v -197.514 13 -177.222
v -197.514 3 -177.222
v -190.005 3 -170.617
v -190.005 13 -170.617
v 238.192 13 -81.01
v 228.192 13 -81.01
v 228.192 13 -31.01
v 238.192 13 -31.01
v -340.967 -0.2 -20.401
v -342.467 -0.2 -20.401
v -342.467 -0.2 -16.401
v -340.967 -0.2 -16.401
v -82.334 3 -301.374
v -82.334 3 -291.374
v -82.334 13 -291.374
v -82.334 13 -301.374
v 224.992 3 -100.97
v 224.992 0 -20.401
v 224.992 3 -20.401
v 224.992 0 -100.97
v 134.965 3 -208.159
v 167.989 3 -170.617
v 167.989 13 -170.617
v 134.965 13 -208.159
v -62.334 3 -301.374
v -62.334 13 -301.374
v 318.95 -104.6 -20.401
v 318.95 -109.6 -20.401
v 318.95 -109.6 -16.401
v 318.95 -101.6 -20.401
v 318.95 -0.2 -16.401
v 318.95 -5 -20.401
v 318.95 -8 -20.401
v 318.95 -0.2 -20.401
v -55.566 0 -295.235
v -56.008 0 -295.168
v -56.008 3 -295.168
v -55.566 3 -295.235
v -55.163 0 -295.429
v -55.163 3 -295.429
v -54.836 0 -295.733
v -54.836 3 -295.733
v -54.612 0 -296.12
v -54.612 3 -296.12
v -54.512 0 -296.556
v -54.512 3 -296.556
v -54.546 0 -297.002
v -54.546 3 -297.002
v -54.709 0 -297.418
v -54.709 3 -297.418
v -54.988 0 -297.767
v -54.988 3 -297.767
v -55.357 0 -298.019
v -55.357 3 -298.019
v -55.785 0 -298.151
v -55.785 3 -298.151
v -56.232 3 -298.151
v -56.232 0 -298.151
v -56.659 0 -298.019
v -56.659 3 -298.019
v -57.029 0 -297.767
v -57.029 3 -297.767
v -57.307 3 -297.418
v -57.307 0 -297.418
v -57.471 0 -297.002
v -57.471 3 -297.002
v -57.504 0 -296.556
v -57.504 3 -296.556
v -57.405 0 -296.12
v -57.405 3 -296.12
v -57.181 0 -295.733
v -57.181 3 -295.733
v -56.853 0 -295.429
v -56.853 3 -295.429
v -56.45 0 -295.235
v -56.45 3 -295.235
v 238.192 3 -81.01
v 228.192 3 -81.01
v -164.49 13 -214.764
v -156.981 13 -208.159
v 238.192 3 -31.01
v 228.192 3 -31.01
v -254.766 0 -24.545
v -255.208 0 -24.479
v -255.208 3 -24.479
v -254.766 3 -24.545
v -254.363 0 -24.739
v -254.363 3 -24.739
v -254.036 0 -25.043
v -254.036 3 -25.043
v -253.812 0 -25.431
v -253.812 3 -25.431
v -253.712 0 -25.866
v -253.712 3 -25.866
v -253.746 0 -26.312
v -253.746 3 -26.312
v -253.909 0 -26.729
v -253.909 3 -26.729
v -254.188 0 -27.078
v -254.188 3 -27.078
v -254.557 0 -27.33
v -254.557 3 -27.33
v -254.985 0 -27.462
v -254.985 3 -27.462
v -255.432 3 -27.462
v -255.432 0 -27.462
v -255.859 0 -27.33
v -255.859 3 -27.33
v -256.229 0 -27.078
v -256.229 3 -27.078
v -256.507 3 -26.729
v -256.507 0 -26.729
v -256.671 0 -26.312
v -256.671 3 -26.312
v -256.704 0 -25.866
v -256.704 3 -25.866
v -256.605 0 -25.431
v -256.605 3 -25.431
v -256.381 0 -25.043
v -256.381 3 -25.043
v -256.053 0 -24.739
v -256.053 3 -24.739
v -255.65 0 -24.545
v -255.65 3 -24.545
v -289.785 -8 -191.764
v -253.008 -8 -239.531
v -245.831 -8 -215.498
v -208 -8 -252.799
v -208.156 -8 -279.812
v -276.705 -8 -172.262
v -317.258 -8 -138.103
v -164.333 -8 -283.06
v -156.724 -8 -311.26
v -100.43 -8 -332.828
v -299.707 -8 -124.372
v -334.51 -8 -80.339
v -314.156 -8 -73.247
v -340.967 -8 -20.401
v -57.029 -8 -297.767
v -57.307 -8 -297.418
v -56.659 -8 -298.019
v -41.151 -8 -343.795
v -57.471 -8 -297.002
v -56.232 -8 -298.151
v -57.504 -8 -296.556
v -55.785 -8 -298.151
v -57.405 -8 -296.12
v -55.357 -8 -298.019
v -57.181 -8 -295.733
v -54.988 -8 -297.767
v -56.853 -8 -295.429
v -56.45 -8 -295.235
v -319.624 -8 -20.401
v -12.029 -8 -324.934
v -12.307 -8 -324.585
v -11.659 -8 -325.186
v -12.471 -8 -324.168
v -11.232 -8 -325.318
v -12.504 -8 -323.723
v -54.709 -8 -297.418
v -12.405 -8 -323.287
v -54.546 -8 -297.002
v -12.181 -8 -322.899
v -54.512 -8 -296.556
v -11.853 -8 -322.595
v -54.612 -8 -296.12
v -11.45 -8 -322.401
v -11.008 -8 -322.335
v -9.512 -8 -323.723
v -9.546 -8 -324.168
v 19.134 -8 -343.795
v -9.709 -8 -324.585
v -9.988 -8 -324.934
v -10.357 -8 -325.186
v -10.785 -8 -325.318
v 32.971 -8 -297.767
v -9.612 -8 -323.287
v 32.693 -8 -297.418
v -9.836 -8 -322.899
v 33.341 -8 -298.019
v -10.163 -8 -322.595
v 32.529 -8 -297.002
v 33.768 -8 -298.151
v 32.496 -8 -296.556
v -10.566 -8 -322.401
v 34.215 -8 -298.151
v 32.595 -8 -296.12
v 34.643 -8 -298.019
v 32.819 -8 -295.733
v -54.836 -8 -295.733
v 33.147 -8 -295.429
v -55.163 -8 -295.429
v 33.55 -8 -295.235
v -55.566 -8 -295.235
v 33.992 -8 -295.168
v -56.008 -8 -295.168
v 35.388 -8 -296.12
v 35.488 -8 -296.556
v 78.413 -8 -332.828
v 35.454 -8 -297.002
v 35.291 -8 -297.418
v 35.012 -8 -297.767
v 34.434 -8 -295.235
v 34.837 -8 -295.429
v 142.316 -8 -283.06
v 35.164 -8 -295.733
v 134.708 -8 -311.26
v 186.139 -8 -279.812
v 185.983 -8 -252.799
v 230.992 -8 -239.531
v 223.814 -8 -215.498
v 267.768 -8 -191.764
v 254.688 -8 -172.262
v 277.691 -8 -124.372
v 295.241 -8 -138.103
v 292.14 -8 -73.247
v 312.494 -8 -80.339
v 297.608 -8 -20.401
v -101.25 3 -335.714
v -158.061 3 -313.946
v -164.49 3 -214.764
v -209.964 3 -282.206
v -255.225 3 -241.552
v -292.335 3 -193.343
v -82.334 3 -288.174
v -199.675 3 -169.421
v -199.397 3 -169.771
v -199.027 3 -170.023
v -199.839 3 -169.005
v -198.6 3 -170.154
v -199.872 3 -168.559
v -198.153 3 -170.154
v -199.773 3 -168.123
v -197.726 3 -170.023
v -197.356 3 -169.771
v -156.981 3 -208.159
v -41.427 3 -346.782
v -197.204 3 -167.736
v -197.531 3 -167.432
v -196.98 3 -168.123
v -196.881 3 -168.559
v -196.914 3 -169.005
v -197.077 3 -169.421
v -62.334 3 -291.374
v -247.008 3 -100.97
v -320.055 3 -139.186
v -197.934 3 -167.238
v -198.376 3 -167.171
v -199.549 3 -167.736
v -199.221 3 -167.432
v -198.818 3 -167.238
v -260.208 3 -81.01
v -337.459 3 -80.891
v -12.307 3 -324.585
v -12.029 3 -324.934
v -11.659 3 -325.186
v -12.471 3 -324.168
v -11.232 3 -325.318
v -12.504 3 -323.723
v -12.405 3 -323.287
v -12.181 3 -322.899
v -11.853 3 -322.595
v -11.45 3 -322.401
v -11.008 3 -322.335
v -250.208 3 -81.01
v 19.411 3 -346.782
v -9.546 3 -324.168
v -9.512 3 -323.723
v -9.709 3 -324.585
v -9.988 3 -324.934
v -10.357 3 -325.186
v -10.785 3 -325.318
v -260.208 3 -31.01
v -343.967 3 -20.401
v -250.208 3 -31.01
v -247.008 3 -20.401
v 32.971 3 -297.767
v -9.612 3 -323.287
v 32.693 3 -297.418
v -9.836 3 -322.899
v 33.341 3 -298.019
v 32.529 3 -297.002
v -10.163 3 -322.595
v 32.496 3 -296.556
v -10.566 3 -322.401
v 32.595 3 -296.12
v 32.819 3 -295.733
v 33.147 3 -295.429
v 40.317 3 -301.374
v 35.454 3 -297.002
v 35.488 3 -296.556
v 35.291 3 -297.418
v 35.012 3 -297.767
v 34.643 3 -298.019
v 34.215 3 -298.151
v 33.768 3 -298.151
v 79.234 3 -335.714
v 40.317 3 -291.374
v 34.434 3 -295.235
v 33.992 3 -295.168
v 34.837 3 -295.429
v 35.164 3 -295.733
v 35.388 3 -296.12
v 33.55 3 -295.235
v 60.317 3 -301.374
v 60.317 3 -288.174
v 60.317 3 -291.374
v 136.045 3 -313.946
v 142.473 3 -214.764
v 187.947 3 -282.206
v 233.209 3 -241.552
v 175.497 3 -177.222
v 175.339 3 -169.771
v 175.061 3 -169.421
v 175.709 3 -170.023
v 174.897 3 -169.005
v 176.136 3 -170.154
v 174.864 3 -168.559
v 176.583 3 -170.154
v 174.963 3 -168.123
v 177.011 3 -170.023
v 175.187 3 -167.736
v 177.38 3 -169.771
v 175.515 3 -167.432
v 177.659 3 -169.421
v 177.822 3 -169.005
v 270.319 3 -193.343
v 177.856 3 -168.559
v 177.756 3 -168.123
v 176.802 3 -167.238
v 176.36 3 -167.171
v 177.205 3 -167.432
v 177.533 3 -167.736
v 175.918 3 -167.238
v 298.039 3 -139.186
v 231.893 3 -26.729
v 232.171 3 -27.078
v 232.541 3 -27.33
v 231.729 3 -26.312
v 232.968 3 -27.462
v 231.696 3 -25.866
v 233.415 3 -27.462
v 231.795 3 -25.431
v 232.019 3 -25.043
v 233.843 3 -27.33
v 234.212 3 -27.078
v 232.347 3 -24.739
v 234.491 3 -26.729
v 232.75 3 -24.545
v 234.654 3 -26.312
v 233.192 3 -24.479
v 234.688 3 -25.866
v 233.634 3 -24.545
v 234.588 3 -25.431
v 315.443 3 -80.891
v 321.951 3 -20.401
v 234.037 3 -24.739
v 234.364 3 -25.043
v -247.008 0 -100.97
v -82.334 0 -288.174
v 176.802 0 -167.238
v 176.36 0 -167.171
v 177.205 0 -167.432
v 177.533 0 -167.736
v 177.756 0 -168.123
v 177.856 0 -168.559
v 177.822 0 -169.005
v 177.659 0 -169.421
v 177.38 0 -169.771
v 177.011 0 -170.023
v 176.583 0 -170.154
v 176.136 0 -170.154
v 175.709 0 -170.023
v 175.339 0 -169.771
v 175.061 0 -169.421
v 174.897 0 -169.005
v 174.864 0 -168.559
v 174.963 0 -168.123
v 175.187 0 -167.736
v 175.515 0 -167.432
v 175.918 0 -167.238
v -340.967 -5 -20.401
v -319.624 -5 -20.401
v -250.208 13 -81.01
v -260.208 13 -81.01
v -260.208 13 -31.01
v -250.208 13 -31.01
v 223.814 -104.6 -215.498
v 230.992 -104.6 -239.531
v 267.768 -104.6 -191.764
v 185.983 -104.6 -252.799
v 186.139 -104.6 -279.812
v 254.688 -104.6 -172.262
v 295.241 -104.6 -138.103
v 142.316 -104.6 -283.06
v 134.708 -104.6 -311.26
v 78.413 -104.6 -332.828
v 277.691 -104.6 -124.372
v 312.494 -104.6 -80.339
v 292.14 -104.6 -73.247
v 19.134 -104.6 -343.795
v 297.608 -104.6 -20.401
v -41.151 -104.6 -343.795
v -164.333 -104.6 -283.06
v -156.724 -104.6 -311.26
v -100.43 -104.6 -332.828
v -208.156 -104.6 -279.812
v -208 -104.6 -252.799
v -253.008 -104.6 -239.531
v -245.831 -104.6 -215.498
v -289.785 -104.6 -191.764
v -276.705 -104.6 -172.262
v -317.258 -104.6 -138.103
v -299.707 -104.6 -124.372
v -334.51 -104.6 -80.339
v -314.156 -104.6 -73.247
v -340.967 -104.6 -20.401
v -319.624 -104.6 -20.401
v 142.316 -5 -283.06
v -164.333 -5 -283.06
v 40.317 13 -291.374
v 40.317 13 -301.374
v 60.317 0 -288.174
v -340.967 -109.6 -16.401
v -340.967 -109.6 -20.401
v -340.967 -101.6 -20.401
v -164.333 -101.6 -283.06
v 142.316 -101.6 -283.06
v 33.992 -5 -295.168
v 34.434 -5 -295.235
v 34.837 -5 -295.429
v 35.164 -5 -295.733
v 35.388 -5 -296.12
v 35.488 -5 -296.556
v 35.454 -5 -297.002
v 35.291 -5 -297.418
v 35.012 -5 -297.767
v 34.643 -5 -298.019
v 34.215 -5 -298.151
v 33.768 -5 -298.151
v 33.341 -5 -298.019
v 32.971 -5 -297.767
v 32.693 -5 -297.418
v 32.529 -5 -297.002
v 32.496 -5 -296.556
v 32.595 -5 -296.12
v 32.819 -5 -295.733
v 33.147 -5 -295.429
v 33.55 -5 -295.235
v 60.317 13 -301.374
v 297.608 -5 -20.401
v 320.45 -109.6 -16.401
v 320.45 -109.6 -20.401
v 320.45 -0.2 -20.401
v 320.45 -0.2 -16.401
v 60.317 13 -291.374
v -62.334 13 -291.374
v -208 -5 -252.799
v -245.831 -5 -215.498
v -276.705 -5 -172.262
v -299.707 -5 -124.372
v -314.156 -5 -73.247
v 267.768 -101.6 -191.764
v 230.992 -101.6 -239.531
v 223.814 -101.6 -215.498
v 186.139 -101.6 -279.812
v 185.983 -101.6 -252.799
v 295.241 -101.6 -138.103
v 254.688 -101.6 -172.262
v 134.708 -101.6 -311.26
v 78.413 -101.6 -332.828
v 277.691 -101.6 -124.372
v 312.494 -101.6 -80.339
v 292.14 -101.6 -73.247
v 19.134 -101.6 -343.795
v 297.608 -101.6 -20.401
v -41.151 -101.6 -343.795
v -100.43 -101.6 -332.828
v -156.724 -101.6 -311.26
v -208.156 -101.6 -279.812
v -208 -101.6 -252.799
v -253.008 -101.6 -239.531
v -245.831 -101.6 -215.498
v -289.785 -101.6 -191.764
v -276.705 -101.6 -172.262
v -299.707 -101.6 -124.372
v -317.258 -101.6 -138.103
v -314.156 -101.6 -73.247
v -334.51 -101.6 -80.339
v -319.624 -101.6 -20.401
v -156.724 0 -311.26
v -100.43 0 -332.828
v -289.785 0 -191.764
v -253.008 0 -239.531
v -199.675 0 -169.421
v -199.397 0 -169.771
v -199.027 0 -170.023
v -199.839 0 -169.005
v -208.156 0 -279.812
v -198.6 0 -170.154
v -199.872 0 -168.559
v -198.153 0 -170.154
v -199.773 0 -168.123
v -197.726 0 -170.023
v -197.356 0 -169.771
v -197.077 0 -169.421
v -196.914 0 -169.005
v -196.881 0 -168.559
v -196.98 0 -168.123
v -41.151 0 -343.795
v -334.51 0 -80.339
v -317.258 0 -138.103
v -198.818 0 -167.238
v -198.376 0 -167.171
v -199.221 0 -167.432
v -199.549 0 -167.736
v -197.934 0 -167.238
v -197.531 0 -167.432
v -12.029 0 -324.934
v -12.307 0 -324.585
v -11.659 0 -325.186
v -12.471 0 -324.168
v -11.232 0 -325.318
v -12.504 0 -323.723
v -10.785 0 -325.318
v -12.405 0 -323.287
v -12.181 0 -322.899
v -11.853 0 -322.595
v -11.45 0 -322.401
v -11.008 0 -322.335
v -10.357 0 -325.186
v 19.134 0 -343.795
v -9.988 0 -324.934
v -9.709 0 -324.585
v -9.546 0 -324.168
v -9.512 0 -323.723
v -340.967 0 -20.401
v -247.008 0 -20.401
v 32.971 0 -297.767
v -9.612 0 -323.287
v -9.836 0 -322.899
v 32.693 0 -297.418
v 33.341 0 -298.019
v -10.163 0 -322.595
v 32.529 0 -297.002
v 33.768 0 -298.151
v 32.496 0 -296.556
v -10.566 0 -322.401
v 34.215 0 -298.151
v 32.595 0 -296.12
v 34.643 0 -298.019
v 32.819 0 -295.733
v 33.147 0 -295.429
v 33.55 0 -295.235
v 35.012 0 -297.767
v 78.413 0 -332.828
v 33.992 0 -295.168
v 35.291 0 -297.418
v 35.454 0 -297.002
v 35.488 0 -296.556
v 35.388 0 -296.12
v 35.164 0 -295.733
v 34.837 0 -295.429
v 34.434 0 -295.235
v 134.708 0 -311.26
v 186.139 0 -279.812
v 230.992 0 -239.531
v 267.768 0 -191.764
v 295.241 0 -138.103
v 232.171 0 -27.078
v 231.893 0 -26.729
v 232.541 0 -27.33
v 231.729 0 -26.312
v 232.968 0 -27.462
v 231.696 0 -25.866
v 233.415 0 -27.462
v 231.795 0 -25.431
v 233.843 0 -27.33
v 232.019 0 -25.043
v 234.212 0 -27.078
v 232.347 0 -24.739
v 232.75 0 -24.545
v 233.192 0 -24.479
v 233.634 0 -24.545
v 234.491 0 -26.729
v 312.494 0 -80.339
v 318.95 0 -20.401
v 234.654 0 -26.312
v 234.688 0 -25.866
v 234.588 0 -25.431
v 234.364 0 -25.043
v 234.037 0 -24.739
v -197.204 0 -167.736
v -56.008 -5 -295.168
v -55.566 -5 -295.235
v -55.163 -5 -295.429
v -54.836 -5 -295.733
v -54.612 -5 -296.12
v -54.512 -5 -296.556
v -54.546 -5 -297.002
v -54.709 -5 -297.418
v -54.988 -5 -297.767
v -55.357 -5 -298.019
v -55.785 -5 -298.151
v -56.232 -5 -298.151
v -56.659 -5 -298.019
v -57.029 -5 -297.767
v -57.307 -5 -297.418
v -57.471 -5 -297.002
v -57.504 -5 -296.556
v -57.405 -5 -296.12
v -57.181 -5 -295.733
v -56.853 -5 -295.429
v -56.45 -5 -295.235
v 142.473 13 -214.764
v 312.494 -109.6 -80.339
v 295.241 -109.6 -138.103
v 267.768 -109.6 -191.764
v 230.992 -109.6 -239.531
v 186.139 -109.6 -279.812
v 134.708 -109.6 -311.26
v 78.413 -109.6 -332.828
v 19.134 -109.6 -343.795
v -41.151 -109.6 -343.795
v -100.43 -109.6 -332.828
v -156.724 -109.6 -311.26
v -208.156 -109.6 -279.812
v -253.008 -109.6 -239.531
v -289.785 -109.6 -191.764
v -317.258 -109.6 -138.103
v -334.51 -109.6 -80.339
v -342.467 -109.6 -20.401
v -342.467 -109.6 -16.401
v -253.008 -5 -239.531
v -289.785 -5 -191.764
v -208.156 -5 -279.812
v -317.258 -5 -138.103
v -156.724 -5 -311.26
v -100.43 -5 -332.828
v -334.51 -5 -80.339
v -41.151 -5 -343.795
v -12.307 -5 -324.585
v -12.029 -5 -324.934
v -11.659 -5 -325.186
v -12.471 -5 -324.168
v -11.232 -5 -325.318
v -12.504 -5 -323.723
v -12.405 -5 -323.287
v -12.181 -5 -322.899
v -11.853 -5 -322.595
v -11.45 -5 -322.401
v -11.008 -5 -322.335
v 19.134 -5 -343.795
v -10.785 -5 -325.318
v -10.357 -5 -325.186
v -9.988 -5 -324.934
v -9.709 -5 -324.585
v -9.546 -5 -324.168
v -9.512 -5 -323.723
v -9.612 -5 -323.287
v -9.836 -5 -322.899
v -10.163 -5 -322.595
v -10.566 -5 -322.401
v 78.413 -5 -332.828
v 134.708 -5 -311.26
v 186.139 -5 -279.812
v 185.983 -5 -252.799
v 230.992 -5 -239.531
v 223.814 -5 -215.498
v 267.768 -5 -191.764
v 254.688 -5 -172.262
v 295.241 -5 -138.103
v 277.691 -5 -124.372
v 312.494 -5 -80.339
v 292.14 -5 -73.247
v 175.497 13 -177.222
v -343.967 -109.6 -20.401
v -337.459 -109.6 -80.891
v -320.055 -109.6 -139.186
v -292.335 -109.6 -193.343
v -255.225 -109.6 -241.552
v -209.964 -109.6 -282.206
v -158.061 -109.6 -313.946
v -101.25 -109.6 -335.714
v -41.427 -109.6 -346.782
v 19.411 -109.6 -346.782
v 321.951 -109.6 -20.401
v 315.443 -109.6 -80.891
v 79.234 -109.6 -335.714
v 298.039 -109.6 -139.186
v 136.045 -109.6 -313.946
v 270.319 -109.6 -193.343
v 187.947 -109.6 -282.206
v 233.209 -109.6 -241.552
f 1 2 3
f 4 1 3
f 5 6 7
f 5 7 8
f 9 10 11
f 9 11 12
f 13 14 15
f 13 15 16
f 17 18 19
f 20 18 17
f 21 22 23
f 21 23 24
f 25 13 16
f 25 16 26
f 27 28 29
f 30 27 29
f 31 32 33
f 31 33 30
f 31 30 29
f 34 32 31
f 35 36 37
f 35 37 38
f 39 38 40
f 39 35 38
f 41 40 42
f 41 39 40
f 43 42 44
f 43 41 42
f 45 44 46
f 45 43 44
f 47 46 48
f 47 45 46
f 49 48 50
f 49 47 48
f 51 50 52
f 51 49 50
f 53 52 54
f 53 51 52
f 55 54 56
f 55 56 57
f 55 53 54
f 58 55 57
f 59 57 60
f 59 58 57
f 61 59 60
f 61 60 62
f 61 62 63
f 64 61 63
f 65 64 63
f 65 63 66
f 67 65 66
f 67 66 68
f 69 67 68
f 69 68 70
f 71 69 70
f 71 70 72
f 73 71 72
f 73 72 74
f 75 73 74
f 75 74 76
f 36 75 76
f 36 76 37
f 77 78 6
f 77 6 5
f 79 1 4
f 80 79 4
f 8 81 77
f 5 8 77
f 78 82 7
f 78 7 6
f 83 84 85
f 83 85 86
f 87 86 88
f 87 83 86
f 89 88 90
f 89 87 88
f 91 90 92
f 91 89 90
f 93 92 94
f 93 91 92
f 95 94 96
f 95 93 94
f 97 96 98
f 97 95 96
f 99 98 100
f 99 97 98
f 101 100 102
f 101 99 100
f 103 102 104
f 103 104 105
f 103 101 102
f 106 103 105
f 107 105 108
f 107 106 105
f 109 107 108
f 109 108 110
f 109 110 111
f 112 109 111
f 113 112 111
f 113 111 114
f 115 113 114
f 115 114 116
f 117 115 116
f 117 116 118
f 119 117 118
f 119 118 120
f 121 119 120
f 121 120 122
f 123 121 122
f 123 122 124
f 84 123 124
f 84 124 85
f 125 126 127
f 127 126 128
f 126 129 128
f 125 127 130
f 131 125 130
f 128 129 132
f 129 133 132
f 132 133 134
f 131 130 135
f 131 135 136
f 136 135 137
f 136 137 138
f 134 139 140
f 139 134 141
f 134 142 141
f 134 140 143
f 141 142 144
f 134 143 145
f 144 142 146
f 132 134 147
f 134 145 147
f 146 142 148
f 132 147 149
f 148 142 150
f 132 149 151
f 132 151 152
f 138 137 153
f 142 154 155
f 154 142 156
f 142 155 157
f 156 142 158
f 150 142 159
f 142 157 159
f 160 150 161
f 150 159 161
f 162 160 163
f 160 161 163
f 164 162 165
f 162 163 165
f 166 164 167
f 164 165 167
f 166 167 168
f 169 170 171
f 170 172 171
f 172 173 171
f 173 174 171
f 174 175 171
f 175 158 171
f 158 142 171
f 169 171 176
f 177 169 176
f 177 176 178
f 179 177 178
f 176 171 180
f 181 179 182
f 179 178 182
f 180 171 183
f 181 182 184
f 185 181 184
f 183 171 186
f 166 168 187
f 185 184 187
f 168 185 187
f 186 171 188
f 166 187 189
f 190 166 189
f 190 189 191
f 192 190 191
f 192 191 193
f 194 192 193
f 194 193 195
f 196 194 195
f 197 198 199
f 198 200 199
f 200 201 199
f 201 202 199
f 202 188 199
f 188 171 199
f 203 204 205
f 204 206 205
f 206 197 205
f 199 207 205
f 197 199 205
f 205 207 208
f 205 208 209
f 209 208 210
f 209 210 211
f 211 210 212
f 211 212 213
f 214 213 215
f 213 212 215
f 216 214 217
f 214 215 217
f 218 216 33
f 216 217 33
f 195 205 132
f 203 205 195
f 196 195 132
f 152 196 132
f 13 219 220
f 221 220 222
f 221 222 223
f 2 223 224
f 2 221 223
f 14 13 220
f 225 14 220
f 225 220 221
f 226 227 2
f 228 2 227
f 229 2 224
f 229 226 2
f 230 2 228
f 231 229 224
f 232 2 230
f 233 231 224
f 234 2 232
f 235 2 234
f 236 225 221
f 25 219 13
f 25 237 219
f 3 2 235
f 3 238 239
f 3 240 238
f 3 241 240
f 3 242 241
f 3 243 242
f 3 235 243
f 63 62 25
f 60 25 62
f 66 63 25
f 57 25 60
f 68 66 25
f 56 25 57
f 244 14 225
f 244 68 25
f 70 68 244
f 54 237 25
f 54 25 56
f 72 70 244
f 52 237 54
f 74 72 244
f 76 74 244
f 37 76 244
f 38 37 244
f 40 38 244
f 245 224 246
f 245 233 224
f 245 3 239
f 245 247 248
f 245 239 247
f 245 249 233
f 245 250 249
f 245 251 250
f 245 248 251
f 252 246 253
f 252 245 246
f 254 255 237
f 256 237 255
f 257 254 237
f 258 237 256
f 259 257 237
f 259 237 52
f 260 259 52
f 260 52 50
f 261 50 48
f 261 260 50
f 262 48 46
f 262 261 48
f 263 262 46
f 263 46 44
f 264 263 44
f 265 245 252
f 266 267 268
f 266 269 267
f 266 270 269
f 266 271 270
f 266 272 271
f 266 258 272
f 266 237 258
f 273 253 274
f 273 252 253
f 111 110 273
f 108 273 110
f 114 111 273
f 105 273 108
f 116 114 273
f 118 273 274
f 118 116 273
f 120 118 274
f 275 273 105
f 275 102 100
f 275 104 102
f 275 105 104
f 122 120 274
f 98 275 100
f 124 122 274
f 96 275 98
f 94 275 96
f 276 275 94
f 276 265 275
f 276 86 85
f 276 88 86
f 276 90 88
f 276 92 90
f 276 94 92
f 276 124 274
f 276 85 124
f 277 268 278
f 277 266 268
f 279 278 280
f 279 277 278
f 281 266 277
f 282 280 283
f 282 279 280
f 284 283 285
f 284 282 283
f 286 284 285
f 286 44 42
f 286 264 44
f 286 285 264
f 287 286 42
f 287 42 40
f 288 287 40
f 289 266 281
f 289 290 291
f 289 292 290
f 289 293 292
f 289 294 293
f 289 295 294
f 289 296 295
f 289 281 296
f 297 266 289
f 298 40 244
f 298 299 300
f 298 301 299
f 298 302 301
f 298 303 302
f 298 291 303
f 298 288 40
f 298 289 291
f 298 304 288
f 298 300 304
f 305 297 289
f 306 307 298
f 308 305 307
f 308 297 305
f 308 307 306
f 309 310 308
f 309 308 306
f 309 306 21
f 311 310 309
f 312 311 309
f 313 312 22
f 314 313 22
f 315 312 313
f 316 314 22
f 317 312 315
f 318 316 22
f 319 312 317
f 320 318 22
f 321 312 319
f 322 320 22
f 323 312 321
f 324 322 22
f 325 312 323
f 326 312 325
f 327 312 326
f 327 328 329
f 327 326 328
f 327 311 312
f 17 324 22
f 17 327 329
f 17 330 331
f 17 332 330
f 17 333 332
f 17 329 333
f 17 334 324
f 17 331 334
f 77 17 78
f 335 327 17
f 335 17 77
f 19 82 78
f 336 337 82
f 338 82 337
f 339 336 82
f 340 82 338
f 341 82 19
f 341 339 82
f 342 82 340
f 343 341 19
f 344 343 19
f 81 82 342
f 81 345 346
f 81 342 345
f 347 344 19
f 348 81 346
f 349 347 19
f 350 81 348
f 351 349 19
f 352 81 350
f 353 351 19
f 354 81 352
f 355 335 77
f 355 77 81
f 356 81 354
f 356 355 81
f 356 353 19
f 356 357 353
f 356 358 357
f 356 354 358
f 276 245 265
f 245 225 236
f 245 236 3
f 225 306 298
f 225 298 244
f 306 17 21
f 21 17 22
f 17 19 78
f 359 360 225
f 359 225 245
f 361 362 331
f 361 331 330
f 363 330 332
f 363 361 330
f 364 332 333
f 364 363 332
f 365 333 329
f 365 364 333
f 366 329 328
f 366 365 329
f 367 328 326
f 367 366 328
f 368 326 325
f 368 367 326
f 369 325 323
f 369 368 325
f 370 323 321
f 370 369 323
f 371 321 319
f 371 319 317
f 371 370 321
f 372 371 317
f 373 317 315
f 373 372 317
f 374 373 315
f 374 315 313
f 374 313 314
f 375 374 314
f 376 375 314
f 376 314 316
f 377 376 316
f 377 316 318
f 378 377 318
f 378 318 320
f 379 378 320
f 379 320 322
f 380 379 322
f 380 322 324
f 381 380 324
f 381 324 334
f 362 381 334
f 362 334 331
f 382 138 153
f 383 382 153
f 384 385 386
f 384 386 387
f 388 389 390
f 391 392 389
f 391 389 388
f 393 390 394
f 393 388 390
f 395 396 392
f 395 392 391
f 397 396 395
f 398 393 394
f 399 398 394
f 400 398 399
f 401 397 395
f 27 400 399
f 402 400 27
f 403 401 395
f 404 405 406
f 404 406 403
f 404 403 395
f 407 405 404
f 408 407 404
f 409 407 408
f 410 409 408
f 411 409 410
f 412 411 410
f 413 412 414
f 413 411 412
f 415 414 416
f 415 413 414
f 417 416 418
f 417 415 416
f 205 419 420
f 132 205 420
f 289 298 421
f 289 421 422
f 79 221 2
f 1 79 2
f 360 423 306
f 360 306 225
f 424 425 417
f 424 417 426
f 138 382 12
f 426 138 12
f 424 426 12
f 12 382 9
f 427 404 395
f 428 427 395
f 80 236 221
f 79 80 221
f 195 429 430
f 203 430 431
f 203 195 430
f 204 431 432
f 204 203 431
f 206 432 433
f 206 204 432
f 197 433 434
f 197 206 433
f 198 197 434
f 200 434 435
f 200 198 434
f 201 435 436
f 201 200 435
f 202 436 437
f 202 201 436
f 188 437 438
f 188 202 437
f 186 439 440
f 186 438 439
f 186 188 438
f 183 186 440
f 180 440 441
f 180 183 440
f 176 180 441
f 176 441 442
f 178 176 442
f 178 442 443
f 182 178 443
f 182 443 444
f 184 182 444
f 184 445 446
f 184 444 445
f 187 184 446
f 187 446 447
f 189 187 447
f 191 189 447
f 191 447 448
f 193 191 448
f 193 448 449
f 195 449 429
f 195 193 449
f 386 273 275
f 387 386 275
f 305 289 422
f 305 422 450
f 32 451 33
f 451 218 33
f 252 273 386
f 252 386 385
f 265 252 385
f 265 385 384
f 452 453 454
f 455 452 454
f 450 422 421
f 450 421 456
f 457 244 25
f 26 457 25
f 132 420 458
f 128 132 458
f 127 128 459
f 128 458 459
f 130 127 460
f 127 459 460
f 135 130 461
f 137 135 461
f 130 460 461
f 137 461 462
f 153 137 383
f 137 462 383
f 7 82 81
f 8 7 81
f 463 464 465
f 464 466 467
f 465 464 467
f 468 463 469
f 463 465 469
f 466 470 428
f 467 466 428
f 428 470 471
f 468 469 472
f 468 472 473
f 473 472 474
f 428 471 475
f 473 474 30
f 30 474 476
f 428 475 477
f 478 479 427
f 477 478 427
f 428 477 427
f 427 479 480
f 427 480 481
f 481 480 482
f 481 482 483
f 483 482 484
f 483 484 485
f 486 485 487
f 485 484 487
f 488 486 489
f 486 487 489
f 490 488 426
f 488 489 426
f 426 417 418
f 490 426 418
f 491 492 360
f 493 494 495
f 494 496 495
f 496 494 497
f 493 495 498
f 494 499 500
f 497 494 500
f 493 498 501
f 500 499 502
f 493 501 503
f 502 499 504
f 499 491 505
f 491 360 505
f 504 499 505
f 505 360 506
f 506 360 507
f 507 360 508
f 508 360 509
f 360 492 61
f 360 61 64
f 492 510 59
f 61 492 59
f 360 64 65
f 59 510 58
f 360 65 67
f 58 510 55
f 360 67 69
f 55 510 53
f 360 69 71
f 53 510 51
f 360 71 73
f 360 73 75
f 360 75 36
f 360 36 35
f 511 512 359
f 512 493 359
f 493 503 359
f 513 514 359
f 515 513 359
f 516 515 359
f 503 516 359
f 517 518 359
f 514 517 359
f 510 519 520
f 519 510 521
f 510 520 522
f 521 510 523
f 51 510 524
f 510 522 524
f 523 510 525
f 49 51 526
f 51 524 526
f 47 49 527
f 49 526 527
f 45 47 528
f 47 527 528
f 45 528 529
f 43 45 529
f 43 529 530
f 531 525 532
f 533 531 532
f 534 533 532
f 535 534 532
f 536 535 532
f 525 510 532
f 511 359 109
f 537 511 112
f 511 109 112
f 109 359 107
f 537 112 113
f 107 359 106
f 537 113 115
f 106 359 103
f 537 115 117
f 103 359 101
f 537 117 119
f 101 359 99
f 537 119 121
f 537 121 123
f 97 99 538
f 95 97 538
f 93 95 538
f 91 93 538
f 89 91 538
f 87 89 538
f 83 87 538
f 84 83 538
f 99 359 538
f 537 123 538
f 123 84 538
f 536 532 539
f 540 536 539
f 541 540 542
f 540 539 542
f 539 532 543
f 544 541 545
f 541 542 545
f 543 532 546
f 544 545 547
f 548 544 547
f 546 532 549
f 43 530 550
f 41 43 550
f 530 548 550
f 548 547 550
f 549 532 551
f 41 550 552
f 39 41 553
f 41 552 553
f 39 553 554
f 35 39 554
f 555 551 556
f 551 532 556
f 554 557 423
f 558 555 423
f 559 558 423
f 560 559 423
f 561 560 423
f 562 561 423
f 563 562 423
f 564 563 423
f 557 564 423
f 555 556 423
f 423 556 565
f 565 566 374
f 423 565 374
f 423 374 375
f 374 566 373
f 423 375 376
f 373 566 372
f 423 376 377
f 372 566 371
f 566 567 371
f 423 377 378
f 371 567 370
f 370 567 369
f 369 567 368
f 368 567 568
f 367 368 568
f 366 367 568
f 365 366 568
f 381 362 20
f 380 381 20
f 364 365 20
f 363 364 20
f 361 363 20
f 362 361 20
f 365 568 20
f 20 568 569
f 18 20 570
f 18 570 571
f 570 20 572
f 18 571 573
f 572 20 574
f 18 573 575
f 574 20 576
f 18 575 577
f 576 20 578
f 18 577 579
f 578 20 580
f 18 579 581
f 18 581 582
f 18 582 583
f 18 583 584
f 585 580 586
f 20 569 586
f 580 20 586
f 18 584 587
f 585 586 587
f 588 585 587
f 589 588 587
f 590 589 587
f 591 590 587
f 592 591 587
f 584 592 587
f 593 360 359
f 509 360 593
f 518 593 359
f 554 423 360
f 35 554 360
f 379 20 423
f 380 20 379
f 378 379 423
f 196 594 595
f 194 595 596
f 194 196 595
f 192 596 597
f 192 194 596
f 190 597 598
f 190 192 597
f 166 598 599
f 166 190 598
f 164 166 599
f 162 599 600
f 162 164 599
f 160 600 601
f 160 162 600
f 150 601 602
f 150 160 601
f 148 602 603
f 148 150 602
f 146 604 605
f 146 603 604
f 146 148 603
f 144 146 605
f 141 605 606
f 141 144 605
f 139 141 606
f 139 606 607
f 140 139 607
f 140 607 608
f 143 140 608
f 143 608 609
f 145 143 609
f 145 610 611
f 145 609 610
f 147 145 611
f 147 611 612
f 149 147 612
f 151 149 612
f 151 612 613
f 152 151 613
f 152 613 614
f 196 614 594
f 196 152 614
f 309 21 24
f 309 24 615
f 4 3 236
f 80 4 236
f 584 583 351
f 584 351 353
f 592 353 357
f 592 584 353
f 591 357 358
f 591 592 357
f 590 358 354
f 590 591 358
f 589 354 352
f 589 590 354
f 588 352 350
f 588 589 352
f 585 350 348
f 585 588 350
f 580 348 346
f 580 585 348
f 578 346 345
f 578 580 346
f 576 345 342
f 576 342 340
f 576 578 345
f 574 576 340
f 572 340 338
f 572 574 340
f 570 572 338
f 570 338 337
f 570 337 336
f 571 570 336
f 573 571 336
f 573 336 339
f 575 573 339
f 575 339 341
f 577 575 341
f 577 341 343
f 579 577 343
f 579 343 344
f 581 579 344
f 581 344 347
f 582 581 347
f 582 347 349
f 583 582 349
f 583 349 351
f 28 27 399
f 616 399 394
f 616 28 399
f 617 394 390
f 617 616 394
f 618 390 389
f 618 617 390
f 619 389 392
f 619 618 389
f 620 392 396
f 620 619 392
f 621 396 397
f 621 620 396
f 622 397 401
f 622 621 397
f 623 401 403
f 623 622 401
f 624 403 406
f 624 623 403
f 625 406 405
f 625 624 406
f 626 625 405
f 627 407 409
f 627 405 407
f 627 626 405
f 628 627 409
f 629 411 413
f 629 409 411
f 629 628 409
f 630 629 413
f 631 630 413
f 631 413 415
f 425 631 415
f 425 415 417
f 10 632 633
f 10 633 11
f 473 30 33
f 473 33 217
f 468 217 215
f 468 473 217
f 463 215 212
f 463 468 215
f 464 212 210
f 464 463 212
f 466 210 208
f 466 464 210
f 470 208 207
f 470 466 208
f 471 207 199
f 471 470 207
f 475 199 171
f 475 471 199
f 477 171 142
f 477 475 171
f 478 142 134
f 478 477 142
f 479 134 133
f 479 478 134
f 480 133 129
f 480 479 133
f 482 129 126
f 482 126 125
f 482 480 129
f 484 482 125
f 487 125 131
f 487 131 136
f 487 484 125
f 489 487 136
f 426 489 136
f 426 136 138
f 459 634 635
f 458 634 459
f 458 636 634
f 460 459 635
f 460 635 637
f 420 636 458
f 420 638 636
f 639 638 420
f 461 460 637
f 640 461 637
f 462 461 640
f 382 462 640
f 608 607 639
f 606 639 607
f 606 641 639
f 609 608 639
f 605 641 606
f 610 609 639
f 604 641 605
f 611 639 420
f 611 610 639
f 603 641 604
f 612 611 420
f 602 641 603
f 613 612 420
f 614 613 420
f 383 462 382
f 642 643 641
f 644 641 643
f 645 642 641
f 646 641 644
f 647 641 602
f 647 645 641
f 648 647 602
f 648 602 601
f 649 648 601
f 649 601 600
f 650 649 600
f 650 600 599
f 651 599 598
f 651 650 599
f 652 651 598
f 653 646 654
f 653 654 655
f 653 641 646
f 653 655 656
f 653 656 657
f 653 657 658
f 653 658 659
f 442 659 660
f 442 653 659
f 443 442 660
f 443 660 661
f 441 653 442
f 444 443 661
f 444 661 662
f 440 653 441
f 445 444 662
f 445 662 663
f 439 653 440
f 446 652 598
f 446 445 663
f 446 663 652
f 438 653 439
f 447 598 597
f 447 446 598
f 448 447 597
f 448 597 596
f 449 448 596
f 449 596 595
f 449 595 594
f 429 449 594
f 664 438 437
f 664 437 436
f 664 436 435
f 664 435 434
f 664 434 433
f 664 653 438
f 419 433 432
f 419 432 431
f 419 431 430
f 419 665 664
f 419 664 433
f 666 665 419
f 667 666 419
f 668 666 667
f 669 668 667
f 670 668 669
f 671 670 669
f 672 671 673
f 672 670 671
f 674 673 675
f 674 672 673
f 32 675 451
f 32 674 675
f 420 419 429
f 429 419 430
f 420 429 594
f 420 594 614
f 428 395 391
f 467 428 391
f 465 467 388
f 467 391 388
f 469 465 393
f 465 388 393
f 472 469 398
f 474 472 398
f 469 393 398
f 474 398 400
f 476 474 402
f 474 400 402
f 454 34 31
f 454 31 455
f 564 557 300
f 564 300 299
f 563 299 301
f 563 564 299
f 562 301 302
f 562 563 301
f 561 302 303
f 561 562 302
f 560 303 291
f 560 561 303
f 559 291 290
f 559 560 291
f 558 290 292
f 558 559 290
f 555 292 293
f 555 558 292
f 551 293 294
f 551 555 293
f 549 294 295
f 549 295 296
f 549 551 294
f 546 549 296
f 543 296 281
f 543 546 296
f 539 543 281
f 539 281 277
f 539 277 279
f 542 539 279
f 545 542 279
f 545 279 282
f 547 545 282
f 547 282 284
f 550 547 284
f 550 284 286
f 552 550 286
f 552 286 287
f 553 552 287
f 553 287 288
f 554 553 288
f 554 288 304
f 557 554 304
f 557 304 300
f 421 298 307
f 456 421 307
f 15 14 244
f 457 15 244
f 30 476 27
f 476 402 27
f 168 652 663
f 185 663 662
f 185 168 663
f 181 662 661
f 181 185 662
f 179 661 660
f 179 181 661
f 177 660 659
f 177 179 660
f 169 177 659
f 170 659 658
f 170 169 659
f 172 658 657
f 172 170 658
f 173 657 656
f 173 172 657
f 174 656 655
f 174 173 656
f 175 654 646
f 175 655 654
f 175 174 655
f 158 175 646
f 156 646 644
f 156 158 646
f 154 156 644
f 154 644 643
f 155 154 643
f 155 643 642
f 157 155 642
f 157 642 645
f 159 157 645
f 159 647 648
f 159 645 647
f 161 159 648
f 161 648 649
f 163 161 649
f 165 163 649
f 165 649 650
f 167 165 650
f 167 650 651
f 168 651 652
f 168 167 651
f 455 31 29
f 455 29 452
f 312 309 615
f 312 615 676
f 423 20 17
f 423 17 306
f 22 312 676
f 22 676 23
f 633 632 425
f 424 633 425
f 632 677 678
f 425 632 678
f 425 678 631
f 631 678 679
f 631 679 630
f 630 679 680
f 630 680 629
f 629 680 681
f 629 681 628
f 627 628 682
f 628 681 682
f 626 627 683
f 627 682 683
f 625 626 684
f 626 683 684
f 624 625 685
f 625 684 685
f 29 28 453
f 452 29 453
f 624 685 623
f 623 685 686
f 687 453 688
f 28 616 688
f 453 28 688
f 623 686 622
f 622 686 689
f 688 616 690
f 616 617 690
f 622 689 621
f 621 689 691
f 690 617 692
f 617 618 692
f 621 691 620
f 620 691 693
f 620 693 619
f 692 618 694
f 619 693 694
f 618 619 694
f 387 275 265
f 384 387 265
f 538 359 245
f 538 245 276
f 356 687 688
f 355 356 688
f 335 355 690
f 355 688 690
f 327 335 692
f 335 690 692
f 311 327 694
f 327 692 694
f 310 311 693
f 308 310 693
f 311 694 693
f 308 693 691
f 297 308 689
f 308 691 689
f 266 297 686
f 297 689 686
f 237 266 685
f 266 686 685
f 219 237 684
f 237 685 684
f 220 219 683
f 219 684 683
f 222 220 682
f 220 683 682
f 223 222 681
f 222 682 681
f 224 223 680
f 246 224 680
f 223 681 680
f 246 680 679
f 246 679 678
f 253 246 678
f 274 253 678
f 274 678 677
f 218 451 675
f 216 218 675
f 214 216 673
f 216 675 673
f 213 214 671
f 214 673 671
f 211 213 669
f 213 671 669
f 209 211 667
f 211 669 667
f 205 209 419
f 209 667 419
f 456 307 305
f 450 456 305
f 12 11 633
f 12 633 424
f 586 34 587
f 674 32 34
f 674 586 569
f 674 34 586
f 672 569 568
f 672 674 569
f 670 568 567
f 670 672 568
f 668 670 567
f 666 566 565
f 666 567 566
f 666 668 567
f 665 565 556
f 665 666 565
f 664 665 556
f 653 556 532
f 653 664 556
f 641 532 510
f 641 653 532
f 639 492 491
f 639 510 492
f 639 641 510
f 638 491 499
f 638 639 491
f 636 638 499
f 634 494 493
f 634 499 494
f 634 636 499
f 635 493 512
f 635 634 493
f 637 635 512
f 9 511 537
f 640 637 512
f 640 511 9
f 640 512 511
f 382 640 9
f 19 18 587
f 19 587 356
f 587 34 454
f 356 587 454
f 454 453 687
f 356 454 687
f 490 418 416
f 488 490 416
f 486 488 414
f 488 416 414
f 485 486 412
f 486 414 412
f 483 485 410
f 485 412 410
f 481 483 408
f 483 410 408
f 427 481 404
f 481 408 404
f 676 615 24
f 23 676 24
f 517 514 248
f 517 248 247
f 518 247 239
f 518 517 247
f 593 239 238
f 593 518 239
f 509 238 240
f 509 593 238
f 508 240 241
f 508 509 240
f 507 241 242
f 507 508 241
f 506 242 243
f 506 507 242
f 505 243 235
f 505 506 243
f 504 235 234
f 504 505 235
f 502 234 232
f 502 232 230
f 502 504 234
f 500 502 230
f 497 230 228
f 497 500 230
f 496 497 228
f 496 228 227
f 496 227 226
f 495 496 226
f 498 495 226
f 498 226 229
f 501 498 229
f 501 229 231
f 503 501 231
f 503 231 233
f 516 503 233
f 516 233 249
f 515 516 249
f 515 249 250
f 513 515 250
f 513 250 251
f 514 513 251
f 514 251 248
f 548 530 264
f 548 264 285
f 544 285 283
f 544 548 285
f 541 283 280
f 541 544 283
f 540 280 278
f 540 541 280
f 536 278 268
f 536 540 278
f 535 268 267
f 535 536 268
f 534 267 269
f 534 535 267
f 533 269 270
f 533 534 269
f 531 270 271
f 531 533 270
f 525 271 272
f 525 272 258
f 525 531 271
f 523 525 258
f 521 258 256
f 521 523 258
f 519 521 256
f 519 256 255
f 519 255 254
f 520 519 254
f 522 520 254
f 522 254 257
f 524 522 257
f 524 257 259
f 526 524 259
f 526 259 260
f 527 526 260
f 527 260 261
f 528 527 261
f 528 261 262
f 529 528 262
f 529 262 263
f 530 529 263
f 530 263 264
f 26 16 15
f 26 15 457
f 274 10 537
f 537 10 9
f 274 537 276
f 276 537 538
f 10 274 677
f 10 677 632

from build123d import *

# Parameters (mm, degrees)
BOSS_EXTRUDE2_DEPTH      = 3
BOSS_EXTRUDE2_DEPTH_BACK = 109.6
SKETCH3_R                = 333
SKETCH3_R_2              = 330
SKETCH5_R                = 330
BOSS_EXTRUDE4_DEPTH      = 3
SKETCH6_R                = 333
BOSS_EXTRUDE6_DEPTH      = 3
SKETCH17_R               = 330
BOSS_EXTRUDE9_DEPTH      = 3
CUT_EXTRUDE1_DEPTH       = 503.240857237
CUT_EXTRUDE1_DEPTH_BACK  = 503.240857237
SKETCH18_W               = 721.551246538
SKETCH18_H               = 348.822819085
SKETCH19_W               = 10
SKETCH19_H               = 50
SKETCH19_W_2             = 20
SKETCH19_H_2             = 10
BOSS_EXTRUDE10_DEPTH     = 10
SKETCH23_W               = 1.500186503
SKETCH23_H               = 109.4
BOSS_EXTRUDE11_DEPTH     = 4
CUT_EXTRUDE2_START       = -11
SKETCH25_R               = 1.5
CUT_EXTRUDE2_DEPTH       = 11


with BuildPart() as part:
    # Sketch3 → Boss-Extrude2 (new, two sides: drawn at the far end of the back side and taken through both)
    with BuildSketch(Plane(origin=(0, 0, 0), x_dir=(1, 0, 0), z_dir=(0, 1, 0)).offset(-BOSS_EXTRUDE2_DEPTH_BACK)):
        with Locations(Location((-11.008302555, 15.174390861, 0), (0, 0, 270))):
            Circle(SKETCH3_R)
        with Locations(Location((-11.008302555, 15.174390861, 0), (0, 0, 270))):
            Circle(SKETCH3_R_2, mode=Mode.SUBTRACT)
    extrude(amount=BOSS_EXTRUDE2_DEPTH + BOSS_EXTRUDE2_DEPTH_BACK)

    # Sketch5 → Boss-Extrude4 (add)
    with BuildSketch(Plane.XZ.offset(104.6)):
        with Locations(Location((-11.008302555, -15.174390861, 0), (0, 0, 90))):
            Circle(SKETCH5_R)
        with BuildLine():
            Line((-164.332788108, -283.060090014), (142.316182998, -283.060090014))
            ThreePointArc((142.316182998, -283.060090014), (-11.008302555, 293.485852256), (-164.332788108, -283.060090014))
        make_face(mode=Mode.SUBTRACT)
    extrude(amount=-BOSS_EXTRUDE4_DEPTH)

    # Sketch6 → Boss-Extrude6 (add)
    with BuildSketch(Plane(origin=(0, 0, 0), x_dir=(1, 0, 0), z_dir=(0, 1, 0))):
        with Locations(Location((-11.008302555, 15.174390861, 0), (0, 0, 270))):
            Circle(SKETCH6_R)
        Polygon((187.991697445, -189.598621739), (187.991697445, 20.401378261), (224.991697445, 20.401378261), (224.991697445, 100.970480915), (60.317326344, 288.174390861), (-82.333931455, 288.174390861), (-247.008302555, 100.970480915), (-247.008302555, 20.401378261), (-210.008302555, 20.401378261), (-210.008302555, -189.598621739), align=None, mode=Mode.SUBTRACT)
    extrude(amount=BOSS_EXTRUDE6_DEPTH)

    # Sketch17 → Boss-Extrude9 (add)
    with BuildSketch(Plane(origin=(0, -5, 0), x_dir=(1, 0, 0), z_dir=(0, 1, 0))):
        with Locations(Location((-11.008302555, 15.174390861, 0), (0, 0, 270))):
            Circle(SKETCH17_R)
        with BuildLine():
            Line((142.316182998, 283.060090014), (-164.332788108, 283.060090014))
            ThreePointArc((-164.332788108, 283.060090014), (-11.008302555, -293.485852256), (142.316182998, 283.060090014))
        make_face(mode=Mode.SUBTRACT)
    extrude(amount=-BOSS_EXTRUDE9_DEPTH)

    # Sketch18 → Cut-Extrude1 (cut, two sides: drawn at the far end of the back side and taken through both)
    with BuildSketch(Plane(origin=(0, 3, 0), x_dir=(1, 0, 0), z_dir=(0, 1, 0)).offset(-CUT_EXTRUDE1_DEPTH_BACK)):
        with Locations((-2.663832357, -154.010031282)):
            Rectangle(SKETCH18_W, SKETCH18_H)
    extrude(amount=CUT_EXTRUDE1_DEPTH + CUT_EXTRUDE1_DEPTH_BACK, mode=Mode.SUBTRACT)

    # Sketch19 → Boss-Extrude10 (add)
    with BuildSketch(Plane(origin=(0, 3, 0), x_dir=(1, 0, 0), z_dir=(0, 1, 0))):
        Polygon((-190.005313879, 170.617155509), (-156.981273896, 208.159302266), (-164.489703247, 214.764110263), (-197.513743231, 177.221963505), align=None)
        Polygon((167.988708769, 170.617155509), (134.964668786, 208.159302266), (142.473098137, 214.764110263), (175.49713812, 177.221963505), align=None)
        with Locations((-255.208302555, 56.010036487)):
            Rectangle(SKETCH19_W, SKETCH19_H)
        with Locations((233.191697445, 56.010036487)):
            Rectangle(SKETCH19_W, SKETCH19_H)
        with Locations((-72.333931455, 296.374390861)):
            Rectangle(SKETCH19_W_2, SKETCH19_H_2)
        with Locations((50.317326344, 296.374390861)):
            Rectangle(SKETCH19_W_2, SKETCH19_H_2)
    extrude(amount=BOSS_EXTRUDE10_DEPTH)

    # Sketch23 → Boss-Extrude11 (add)
    with BuildSketch(Plane.XY.offset(-20.401378261)):
        with Locations((319.700392044, -54.9)):
            Rectangle(SKETCH23_W, SKETCH23_H)
        with Locations((-341.716997154, -54.9)):
            Rectangle(SKETCH23_W, SKETCH23_H)
    extrude(amount=BOSS_EXTRUDE11_DEPTH)

    # Sketch25 → Cut-Extrude2 (cut)
    with BuildSketch(Plane(origin=(0, 3, 0), x_dir=(1, 0, 0), z_dir=(0, 1, 0)).offset(CUT_EXTRUDE2_START)):
        with Locations(Location((-56.008302555, 296.667912331, 0), (0, 0, 270))):
            Circle(SKETCH25_R)
        with Locations(Location((33.991697445, 296.667912331, 0), (0, 0, 270))):
            Circle(SKETCH25_R)
        with Locations(Location((-11.008302555, 323.834633978, 0), (0, 0, 270))):
            Circle(SKETCH25_R)
        with Locations(Location((-198.376364015, 168.671082504, 0), (0, 0, 270))):
            Circle(SKETCH25_R)
        with Locations(Location((176.359758905, 168.671082504, 0), (0, 0, 270))):
            Circle(SKETCH25_R)
        with Locations(Location((-255.208302555, 25.978544832, 0), (0, 0, 270))):
            Circle(SKETCH25_R)
        with Locations(Location((233.191697445, 25.978544832, 0), (0, 0, 270))):
            Circle(SKETCH25_R)
    extrude(amount=CUT_EXTRUDE2_DEPTH, mode=Mode.SUBTRACT)


solid = part.part
